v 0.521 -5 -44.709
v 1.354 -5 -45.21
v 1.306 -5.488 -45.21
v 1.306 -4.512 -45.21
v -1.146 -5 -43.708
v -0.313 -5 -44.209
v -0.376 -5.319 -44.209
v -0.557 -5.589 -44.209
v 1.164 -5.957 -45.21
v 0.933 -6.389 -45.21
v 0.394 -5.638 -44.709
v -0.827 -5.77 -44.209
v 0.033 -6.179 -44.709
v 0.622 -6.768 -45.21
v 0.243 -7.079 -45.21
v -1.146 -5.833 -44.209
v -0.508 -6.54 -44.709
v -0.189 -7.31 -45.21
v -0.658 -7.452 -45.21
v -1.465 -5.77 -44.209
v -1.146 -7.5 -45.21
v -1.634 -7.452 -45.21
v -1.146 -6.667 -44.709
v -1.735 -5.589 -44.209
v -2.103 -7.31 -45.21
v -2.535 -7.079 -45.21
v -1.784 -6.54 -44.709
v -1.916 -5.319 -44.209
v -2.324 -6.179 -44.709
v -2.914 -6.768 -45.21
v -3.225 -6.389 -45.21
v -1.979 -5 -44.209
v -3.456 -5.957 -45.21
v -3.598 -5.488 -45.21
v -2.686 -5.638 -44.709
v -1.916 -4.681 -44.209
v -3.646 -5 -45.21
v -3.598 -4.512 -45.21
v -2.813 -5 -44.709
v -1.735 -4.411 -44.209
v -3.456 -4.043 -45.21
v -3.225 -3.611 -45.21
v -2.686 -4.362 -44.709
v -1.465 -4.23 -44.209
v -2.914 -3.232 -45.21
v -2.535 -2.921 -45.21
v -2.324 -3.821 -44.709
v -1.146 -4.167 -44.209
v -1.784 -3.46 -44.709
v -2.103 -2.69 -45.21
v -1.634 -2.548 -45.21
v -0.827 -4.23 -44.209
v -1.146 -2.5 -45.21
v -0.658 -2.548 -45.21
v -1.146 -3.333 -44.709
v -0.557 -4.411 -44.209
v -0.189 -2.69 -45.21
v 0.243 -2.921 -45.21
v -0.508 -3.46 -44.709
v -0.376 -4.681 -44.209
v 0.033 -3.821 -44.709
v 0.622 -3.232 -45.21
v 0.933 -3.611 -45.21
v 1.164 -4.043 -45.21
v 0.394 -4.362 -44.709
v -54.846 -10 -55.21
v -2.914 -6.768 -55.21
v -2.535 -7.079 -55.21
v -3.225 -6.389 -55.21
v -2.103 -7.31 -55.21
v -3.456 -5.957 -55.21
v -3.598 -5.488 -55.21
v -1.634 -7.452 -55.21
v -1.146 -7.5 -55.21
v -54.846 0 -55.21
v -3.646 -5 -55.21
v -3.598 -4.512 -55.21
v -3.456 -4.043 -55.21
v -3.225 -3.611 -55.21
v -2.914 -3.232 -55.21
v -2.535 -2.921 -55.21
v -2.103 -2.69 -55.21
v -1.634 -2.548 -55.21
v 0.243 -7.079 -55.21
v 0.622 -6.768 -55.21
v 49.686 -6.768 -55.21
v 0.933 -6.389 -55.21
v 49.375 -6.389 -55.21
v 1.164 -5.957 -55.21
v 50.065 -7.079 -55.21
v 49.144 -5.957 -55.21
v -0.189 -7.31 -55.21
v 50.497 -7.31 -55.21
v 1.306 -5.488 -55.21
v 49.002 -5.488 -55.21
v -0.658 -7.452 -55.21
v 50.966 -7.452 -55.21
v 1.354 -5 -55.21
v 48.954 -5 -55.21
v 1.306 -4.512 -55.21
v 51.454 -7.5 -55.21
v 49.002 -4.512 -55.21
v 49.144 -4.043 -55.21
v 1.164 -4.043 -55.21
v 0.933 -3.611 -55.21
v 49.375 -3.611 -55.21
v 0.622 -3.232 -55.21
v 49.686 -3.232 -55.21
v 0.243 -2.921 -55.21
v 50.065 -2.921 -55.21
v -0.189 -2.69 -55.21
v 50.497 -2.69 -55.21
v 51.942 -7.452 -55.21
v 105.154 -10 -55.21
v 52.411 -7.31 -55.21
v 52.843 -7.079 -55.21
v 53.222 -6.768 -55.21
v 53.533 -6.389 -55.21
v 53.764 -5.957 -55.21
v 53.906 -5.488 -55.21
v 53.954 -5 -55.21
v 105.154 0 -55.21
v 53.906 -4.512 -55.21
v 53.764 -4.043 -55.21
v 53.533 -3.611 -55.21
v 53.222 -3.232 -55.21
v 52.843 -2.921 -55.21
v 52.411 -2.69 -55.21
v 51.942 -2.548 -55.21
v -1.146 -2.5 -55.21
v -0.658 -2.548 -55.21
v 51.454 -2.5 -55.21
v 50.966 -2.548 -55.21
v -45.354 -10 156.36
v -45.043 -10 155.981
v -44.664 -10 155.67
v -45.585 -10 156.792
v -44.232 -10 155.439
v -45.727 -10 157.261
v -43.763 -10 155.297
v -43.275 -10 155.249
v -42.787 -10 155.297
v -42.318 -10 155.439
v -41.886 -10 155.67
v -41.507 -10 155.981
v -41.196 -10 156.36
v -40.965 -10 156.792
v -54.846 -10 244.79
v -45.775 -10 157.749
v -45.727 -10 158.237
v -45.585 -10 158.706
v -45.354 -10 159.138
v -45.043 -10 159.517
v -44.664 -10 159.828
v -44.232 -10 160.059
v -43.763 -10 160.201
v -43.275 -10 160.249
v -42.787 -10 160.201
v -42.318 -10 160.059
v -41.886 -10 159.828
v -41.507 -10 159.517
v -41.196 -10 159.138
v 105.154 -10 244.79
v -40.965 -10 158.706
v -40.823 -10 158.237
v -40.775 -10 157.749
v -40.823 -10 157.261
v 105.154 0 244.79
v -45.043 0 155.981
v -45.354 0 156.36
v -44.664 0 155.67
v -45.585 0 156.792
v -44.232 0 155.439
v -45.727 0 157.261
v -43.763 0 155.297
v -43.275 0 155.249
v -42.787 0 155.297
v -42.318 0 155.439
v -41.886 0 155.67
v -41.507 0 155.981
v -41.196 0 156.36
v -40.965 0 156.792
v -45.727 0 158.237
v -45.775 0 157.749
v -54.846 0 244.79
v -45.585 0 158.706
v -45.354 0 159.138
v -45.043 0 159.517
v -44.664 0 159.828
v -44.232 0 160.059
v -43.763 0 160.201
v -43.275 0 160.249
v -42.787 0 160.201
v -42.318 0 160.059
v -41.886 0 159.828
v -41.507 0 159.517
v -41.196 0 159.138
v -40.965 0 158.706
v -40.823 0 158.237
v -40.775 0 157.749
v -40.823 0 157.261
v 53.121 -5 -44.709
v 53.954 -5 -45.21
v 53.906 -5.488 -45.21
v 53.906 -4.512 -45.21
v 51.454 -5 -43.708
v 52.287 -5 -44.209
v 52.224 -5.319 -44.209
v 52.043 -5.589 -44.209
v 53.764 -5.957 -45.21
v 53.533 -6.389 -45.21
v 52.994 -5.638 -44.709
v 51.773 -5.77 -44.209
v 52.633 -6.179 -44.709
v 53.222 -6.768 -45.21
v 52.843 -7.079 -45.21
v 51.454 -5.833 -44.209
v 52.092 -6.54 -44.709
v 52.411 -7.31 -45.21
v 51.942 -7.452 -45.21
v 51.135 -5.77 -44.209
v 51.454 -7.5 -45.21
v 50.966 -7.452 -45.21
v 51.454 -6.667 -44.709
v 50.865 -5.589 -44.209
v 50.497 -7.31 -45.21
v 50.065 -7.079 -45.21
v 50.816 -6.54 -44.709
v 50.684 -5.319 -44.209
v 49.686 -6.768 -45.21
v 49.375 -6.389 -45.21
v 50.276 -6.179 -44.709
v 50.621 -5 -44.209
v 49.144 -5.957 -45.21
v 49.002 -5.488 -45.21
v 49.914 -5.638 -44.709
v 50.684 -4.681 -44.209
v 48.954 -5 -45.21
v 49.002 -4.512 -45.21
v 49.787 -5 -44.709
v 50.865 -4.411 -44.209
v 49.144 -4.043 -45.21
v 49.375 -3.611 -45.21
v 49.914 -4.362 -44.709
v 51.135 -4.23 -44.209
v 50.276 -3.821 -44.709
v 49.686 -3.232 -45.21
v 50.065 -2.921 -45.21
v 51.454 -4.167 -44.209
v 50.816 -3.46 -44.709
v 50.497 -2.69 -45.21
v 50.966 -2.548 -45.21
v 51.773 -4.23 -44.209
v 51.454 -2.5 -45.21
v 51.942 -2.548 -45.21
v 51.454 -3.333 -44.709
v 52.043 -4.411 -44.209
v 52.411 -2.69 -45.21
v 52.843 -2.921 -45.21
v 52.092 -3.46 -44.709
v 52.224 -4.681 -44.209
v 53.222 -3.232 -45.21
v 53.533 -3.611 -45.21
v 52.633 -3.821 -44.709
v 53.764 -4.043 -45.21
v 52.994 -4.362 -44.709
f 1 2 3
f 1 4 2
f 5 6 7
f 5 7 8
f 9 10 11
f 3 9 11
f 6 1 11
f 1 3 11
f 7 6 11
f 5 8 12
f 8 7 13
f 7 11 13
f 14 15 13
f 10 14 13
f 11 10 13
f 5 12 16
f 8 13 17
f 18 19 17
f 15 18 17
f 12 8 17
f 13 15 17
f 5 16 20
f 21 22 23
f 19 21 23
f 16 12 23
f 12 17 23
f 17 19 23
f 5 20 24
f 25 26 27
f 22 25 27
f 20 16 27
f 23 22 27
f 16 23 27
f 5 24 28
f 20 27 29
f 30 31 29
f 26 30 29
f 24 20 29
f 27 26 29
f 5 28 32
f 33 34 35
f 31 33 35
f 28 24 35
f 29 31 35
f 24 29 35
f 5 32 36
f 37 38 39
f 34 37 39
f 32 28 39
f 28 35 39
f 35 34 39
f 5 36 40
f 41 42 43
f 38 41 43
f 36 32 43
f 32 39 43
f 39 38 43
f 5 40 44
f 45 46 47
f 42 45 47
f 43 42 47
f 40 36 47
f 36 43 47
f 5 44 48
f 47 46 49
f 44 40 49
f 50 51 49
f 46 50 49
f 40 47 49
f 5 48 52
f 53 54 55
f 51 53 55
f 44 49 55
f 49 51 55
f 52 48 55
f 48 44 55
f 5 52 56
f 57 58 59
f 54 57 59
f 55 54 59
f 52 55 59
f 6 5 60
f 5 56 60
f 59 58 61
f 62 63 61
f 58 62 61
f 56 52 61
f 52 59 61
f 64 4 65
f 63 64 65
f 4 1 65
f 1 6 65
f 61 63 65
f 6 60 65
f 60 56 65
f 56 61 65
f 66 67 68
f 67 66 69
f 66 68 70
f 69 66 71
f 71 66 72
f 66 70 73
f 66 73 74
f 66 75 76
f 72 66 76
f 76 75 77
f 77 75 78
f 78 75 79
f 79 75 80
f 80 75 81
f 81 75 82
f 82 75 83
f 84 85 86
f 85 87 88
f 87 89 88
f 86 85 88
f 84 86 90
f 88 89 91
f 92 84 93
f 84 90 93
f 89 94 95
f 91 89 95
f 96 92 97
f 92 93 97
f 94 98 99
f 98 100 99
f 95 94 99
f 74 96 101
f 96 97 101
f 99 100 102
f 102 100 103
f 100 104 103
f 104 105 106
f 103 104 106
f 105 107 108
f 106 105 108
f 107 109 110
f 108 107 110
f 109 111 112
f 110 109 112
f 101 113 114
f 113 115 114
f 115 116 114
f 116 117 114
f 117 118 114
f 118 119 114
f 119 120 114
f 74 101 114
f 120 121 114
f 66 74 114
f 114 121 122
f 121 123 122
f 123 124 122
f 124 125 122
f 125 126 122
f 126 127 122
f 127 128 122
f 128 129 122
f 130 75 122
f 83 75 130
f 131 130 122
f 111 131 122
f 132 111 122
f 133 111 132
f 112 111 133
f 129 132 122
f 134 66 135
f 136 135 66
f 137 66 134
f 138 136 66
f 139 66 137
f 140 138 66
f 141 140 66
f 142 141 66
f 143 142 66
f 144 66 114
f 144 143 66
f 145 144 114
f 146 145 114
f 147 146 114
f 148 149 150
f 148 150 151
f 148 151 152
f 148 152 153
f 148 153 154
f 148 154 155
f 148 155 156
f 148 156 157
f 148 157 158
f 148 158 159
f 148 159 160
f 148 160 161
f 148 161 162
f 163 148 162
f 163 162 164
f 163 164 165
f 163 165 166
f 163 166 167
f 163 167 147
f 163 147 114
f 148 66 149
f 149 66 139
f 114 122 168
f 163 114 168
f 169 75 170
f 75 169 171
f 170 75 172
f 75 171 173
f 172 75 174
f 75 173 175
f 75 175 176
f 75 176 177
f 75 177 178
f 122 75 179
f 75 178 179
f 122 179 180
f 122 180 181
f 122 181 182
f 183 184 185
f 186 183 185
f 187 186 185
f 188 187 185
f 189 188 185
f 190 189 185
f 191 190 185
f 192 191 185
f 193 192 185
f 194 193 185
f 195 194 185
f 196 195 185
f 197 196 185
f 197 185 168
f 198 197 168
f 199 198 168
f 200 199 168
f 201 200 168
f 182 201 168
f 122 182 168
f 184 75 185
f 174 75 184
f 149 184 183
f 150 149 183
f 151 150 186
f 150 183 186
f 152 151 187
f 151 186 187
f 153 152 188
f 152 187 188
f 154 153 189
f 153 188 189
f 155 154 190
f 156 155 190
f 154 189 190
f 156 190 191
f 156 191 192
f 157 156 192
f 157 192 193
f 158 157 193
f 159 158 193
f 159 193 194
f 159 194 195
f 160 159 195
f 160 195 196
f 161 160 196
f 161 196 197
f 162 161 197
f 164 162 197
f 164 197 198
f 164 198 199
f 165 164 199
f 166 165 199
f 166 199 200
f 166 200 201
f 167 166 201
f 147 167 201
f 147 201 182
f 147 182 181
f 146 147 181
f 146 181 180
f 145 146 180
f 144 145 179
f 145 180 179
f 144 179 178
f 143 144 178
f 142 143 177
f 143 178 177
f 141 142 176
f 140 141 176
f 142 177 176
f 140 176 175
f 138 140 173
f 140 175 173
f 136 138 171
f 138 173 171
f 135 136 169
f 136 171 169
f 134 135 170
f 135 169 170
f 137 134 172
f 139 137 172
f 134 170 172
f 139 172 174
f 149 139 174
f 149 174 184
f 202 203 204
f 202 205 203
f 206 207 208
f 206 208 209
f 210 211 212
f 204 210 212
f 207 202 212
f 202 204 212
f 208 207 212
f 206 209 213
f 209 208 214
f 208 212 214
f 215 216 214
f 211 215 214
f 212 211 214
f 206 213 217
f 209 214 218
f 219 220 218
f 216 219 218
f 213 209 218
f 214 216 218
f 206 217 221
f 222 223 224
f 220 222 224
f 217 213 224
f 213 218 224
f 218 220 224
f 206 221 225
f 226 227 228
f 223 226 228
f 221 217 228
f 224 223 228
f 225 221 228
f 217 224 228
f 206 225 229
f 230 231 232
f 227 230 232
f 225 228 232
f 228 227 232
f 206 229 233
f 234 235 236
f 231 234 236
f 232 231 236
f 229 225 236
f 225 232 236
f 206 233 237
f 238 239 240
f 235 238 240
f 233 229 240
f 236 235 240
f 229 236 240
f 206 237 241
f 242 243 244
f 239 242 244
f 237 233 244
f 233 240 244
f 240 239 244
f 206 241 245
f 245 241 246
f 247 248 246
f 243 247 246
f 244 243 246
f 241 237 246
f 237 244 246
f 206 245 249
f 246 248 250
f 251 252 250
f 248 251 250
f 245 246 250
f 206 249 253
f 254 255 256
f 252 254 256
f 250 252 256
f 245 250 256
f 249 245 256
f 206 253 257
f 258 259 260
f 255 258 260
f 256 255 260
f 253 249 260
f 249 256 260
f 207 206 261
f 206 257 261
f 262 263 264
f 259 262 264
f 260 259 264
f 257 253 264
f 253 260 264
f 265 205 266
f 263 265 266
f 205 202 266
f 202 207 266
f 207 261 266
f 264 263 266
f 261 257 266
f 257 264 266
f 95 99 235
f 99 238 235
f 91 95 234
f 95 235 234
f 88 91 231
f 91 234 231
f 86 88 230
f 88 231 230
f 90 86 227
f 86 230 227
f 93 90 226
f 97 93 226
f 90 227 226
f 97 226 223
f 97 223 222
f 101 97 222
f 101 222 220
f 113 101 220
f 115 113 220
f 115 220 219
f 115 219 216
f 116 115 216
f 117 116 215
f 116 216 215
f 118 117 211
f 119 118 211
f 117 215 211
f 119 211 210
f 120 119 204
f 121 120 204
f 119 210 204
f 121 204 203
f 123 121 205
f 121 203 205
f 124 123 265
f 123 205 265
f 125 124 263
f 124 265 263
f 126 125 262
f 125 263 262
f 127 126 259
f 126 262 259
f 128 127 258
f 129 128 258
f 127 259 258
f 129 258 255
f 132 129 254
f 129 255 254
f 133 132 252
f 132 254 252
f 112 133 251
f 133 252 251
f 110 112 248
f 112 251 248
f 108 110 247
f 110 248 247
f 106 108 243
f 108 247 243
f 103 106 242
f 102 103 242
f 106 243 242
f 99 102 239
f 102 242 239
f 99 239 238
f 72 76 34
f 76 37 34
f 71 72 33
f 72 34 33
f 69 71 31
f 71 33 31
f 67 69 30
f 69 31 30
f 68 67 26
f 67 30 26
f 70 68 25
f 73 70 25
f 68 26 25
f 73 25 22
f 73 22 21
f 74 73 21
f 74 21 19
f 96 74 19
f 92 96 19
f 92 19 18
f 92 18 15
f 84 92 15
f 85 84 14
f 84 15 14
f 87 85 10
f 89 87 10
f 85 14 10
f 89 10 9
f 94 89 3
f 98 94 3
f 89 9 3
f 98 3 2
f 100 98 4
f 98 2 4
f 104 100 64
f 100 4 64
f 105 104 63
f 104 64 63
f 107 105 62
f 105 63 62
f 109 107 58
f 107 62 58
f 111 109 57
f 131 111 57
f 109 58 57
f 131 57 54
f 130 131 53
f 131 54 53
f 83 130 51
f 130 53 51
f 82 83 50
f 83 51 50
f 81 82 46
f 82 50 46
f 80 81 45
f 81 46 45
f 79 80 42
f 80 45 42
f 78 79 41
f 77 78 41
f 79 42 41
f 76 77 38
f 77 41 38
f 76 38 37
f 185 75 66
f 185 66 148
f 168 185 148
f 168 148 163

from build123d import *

# Parameters (mm, degrees)
F0_W     = 160
F0_H     = 300
F1_DEPTH = 10
F3_D     = 5
F3_DEPTH = 10
F3_TIP   = 1.5021515476
F5_D     = 5


with BuildPart() as f1:
    # F0 (on Front) → F1 (new body)
    with BuildSketch(Plane.XZ):
        with Locations((25.1540820301, 94.790057838)):
            Rectangle(F0_W, F0_H)
    extrude(amount=F1_DEPTH)

    # F3
    with Locations(Plane(origin=(0, 0, -55.209942162), x_dir=(1, 0, 0), z_dir=(0, 0, -1))):
        with Locations((-1.1459179699, 5), (51.4540820301, 5)):
            Hole(F3_D / 2, depth=F3_DEPTH)
            with Locations((0, 0, -(F3_DEPTH + F3_TIP / 2))):  # 118° drill point
                Cone(0, F3_D / 2, F3_TIP, mode=Mode.SUBTRACT)

    # F5 (through all)
    with Locations(Plane.XZ.offset(10)):
        with Locations((-43.2748445049, 157.7490222116)):
            Hole(F5_D / 2)


solid = f1.part
